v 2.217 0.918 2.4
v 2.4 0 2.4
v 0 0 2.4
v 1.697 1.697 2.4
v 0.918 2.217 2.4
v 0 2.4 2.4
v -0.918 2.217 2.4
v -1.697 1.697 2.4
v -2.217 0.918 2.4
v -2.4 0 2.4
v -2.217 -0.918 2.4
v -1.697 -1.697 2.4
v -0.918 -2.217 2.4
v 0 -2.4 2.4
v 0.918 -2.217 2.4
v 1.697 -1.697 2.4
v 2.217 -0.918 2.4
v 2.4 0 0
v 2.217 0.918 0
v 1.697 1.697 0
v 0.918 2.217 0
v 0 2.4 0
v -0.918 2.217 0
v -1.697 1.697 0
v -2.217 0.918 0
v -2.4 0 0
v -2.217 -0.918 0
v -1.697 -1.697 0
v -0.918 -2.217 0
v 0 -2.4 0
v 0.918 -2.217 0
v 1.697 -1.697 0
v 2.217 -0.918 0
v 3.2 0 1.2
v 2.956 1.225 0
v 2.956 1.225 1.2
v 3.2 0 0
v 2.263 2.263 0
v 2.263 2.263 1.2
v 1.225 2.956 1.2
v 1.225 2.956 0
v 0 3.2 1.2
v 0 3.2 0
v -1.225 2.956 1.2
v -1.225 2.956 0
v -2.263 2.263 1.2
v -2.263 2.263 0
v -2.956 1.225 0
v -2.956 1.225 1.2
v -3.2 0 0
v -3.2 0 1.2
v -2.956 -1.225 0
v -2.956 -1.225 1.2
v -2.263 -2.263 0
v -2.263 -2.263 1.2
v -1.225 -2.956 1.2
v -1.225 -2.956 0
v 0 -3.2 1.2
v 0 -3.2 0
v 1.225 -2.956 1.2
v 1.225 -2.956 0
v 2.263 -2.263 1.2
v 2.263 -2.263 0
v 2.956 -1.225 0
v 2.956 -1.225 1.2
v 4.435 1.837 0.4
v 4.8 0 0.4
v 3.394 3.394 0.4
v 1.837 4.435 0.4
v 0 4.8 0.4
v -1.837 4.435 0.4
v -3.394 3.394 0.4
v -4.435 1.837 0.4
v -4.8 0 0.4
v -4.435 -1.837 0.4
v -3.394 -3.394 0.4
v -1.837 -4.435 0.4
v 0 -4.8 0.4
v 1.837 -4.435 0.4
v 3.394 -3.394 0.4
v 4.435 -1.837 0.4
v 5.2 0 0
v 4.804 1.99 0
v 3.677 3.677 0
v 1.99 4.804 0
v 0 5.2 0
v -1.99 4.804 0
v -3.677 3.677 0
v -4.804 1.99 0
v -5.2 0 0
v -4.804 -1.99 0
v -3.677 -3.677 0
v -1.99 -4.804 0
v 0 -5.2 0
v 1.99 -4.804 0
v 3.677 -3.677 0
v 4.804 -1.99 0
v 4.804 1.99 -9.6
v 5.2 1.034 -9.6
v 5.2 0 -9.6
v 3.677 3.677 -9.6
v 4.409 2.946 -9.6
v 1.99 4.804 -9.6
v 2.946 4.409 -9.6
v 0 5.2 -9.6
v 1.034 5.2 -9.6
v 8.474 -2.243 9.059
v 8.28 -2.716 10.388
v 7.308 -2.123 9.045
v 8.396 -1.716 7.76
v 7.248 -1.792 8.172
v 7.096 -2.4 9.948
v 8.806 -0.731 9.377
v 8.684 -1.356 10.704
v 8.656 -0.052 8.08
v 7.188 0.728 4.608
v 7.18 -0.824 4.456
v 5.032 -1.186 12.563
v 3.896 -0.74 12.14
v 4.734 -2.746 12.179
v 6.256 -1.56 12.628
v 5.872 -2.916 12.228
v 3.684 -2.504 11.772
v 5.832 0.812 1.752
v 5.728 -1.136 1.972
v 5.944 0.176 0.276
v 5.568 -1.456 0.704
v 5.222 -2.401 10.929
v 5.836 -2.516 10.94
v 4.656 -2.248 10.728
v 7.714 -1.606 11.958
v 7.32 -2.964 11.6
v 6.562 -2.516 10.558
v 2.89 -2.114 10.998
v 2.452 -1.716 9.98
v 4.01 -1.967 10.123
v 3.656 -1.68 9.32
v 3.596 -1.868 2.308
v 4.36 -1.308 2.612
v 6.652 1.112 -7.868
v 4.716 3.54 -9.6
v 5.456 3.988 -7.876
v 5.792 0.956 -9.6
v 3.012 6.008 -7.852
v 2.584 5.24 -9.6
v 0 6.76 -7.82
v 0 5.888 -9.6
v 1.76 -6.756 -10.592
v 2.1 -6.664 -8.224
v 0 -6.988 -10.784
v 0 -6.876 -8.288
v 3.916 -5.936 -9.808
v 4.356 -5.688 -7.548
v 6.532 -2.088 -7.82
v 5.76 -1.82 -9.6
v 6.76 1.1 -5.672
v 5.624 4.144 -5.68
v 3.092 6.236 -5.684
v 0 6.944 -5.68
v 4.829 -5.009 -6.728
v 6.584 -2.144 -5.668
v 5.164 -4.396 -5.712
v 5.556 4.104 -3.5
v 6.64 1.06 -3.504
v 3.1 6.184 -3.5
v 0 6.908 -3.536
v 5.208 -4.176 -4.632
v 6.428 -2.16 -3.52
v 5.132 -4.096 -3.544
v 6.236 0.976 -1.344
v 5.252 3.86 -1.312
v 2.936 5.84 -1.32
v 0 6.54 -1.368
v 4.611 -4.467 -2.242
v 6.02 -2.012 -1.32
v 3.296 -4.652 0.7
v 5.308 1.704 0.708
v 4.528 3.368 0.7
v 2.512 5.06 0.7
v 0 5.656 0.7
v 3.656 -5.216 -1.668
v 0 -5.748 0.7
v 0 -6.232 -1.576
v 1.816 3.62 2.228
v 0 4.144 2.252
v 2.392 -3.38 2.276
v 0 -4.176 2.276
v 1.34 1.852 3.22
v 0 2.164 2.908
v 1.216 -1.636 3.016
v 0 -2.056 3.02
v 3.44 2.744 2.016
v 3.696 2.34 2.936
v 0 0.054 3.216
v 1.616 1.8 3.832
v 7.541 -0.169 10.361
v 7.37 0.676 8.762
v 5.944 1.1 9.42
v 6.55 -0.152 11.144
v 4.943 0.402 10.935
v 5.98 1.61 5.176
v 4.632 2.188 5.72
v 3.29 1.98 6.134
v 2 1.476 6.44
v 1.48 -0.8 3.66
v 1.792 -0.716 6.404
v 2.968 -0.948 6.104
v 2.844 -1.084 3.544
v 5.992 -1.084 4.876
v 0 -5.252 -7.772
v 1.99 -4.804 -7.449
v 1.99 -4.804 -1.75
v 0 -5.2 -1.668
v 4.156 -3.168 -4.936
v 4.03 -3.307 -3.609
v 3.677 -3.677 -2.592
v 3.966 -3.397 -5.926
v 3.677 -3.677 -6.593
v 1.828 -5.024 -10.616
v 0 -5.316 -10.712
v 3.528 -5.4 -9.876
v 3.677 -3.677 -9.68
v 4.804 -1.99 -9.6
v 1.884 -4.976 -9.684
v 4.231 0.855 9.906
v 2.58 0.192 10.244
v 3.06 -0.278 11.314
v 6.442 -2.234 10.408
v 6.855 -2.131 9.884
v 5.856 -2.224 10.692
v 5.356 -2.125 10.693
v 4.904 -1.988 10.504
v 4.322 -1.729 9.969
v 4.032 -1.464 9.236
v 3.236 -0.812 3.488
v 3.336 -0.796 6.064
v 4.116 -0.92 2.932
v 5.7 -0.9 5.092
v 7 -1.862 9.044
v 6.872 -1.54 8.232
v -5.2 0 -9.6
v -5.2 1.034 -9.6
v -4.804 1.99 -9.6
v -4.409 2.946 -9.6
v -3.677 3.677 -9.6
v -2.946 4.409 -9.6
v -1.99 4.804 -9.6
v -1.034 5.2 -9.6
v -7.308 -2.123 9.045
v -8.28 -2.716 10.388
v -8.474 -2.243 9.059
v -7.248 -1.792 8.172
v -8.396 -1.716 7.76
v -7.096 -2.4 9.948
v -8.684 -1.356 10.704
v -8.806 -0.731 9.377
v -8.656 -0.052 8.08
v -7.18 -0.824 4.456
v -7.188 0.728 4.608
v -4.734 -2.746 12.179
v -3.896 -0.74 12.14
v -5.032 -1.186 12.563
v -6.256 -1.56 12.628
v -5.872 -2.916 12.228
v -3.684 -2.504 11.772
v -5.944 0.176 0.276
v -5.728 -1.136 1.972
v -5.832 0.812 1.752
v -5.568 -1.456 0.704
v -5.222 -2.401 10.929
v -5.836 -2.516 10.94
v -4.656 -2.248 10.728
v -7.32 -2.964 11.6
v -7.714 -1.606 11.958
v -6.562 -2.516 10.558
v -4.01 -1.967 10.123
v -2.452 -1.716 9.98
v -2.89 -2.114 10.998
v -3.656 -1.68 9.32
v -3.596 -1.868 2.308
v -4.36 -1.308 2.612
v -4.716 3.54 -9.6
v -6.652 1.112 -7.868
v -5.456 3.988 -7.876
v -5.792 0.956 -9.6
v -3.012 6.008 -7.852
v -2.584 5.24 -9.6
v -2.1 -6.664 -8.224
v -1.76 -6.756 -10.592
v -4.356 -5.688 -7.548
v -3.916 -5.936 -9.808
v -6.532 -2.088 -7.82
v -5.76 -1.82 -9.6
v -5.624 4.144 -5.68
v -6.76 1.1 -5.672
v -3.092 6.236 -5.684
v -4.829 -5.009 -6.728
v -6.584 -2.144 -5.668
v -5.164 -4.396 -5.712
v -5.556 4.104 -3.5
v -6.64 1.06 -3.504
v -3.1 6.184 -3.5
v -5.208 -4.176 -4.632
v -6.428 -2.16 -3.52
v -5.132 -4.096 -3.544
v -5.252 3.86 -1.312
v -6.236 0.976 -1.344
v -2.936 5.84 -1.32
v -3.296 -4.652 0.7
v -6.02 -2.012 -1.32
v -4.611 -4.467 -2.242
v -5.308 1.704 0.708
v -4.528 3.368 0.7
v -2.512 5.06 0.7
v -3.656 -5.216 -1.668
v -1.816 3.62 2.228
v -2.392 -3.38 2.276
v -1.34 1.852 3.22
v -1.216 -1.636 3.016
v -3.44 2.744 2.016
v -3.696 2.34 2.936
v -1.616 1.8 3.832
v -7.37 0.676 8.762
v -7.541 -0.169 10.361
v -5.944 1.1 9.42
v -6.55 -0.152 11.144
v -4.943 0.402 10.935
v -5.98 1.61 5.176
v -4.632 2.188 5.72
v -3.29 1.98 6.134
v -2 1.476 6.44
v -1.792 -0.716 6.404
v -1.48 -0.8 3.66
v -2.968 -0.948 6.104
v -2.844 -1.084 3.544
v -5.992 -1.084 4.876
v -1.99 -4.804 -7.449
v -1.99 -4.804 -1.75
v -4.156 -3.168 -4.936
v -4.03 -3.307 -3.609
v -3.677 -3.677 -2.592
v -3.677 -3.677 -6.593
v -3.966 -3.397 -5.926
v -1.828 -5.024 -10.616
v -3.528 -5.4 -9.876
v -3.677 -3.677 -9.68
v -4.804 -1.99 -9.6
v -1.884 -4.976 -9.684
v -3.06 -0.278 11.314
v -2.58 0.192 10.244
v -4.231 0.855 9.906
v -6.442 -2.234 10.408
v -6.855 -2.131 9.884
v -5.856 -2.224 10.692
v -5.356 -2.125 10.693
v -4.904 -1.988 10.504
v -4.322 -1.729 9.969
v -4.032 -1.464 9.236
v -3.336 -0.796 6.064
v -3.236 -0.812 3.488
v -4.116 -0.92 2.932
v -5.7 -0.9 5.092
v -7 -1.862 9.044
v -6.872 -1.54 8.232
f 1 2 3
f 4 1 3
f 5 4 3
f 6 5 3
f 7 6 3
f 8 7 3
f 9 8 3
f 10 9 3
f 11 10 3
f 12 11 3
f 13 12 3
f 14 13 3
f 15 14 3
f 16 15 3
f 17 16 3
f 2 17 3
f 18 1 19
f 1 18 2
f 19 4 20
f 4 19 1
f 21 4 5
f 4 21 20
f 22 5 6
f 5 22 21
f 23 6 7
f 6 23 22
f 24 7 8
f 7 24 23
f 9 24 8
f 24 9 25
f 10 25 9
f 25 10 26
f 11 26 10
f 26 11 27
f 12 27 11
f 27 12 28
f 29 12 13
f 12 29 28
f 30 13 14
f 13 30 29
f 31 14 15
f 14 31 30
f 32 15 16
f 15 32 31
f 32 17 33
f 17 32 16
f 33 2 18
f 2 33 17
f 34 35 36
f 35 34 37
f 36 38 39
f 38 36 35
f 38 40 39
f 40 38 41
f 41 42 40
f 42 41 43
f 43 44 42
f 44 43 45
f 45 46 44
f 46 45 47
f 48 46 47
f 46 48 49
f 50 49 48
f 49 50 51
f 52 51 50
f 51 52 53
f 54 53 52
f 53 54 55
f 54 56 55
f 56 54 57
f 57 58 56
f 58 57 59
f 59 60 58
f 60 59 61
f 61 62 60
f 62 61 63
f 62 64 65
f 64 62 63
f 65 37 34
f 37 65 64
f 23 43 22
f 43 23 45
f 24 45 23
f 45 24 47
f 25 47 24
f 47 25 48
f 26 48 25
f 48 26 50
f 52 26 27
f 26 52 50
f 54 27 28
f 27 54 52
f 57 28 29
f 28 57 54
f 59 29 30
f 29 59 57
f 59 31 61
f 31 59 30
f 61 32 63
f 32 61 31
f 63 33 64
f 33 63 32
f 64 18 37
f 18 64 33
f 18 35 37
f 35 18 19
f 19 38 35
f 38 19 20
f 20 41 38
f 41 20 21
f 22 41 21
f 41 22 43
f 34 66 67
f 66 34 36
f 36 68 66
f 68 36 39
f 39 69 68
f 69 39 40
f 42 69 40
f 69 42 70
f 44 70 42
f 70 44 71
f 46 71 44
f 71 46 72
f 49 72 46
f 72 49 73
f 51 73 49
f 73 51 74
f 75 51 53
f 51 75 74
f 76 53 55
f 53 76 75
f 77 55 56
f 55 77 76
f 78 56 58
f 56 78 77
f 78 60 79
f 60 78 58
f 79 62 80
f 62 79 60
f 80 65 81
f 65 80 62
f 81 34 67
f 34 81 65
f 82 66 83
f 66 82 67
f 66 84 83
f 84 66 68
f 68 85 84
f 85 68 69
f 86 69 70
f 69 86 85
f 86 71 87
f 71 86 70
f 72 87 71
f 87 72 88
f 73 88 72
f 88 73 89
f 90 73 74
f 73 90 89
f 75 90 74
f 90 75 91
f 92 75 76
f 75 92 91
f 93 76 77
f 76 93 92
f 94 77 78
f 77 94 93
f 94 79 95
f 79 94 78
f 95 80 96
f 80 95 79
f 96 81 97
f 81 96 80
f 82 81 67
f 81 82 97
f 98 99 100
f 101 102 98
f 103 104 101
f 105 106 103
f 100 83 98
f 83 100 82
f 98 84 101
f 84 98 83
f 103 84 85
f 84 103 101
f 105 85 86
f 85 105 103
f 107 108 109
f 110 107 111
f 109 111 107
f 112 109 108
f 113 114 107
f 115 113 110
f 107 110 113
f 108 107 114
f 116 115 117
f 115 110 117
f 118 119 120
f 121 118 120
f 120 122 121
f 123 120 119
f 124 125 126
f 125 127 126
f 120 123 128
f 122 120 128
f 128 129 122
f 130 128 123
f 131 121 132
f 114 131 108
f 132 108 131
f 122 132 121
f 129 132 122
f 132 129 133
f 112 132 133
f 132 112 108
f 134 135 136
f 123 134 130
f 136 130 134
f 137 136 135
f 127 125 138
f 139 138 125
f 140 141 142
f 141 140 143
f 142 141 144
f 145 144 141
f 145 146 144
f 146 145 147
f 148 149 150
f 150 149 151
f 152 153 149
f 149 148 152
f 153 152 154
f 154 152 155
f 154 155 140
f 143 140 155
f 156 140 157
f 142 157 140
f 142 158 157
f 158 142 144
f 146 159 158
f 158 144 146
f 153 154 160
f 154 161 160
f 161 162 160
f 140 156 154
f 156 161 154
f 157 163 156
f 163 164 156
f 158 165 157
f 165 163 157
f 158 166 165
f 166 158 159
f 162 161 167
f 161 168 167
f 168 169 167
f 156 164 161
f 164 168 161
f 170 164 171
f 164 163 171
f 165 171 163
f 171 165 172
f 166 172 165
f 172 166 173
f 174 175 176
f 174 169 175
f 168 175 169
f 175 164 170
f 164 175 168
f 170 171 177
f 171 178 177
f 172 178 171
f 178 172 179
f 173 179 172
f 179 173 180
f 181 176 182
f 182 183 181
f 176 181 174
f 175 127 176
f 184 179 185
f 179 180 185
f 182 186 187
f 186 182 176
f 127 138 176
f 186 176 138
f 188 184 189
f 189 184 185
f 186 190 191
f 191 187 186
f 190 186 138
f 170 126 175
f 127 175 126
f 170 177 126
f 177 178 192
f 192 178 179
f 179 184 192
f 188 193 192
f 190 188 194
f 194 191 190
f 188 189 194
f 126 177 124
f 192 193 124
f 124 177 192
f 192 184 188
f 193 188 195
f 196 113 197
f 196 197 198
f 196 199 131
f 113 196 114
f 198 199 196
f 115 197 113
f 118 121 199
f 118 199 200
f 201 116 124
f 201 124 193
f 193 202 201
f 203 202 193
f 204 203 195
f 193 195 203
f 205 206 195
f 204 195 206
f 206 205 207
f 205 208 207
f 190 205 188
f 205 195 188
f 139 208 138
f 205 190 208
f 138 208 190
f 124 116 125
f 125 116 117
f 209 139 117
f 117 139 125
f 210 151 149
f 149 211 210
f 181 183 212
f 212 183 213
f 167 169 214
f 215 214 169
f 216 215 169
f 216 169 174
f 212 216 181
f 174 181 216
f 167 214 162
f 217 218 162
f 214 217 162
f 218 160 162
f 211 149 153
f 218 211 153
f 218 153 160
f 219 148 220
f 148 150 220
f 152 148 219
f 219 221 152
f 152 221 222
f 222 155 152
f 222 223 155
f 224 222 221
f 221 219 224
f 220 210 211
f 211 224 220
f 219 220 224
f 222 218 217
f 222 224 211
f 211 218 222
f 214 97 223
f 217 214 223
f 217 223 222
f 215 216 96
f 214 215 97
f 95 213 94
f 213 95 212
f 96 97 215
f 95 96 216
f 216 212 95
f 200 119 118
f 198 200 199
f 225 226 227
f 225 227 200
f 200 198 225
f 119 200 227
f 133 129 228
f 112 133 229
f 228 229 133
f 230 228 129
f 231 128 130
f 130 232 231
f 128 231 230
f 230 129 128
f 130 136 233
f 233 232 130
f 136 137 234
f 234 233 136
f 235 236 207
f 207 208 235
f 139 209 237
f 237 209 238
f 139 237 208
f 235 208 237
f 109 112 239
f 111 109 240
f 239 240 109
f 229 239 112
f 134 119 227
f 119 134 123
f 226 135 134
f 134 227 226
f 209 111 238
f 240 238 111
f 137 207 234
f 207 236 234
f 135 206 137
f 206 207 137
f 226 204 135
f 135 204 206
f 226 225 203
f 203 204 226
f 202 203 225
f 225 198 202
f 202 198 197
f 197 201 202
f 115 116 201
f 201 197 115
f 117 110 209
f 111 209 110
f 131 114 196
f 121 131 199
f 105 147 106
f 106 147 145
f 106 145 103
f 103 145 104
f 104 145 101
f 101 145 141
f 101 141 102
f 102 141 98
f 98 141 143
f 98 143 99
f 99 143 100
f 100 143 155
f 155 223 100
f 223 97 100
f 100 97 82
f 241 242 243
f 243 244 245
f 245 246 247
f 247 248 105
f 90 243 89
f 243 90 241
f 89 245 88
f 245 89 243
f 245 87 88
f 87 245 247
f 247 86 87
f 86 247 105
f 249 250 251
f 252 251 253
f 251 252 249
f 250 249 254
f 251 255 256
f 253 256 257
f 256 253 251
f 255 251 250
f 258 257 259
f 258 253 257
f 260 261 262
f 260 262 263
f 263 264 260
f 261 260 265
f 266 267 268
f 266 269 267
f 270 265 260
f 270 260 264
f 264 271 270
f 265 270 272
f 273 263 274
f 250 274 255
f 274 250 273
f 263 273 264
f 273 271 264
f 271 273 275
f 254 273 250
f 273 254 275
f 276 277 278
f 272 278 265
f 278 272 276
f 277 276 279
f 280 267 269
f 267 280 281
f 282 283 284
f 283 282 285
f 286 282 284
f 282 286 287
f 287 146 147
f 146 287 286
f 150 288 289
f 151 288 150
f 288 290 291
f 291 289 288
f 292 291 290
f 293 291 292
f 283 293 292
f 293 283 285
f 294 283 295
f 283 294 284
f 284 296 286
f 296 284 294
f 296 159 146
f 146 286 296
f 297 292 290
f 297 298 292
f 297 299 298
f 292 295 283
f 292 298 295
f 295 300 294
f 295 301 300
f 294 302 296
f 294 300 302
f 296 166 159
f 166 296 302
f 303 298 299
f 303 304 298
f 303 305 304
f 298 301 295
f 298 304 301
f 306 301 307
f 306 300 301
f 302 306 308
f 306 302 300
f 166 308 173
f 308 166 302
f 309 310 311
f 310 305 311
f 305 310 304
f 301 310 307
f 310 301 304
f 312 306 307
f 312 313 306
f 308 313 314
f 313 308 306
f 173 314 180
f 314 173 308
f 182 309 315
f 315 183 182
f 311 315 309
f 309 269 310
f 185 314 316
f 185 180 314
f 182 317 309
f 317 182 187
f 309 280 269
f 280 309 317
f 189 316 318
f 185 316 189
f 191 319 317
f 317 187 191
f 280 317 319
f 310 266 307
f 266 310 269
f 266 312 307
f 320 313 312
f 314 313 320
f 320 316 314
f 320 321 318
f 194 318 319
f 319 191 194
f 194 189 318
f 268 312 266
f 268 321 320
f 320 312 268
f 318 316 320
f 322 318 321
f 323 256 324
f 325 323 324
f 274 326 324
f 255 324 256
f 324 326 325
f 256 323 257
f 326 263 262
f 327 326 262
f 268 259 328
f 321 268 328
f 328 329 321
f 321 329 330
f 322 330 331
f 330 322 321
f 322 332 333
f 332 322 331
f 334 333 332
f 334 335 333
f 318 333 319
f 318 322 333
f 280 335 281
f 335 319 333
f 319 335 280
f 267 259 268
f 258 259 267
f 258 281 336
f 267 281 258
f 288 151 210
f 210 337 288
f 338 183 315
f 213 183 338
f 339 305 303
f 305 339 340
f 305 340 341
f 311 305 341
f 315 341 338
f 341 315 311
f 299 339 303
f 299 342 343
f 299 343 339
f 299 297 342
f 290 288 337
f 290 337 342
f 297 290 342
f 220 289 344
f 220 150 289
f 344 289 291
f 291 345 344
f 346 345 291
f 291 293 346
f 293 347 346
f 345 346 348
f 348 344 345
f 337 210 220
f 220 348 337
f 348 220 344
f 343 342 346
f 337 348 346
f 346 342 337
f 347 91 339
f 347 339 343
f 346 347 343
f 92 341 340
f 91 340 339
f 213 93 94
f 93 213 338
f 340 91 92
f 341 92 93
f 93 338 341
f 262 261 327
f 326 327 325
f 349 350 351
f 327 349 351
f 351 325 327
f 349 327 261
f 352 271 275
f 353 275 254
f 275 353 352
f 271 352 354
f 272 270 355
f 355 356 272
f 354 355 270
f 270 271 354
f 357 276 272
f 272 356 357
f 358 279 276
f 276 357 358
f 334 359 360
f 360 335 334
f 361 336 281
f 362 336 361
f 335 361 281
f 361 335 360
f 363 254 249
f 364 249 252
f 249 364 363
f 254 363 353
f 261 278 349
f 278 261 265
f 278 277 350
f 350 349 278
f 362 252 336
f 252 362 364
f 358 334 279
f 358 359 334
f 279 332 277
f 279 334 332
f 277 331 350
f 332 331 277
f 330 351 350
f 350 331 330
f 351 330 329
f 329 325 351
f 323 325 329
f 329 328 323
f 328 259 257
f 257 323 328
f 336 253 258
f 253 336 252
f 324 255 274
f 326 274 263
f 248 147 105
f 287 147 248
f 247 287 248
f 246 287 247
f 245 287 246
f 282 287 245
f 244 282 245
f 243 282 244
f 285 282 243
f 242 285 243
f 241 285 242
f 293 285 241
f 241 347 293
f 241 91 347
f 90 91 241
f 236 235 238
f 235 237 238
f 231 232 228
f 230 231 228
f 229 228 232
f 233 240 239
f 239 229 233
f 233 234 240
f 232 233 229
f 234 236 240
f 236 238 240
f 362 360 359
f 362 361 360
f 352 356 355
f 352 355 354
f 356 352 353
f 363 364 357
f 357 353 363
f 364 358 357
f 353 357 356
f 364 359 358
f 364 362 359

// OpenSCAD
use <../lib.scad>
use <../p/4-4con12.scad>
use <../p/4-4con2.scad>
use <../p/4-4disc.scad>
use <s/99244s01.scad>
use <s/99244s02.scad>
use <../p/stud4h.scad>
function ldraw_lib__99244p01() = [
// 0 Minifig Headdress Rabbit with Bright Pink Inner Ear Pattern
// 0 Name: 99244p01.dat
// 0 Author: Gerald Lasser [GeraldLasser]
// 0 !LDRAW_ORG Part UPDATE 2023-04
// 0 !LICENSE Licensed under CC BY 4.0 : see CAreadme.txt
// 
// 0 BFC CERTIFY CCW
  [0,"BFC","CERTIFY"],
  [0,"BFC","CCW"],
// 
// 0 !CATEGORY Minifig Headwear
// 0 !KEYWORDS Bricklink 99244pb01, Bunny, Collectible Minifigures, Costume, Ears
// 0 !KEYWORDS mask, Series 7, Set 8831
// 
// 0 !HISTORY 2023-08-25 [OrionP] Official Update 2023-04
// 
// 
// 1 16 0 -6 0 6 0 0 0 -1 0 0 0 6 4-4disc.dat
  [1,16,0,-6,0,6,0,0,0,-1,0,0,0,6, ldraw_lib__4_4disc()],
// 1 16 0 -3 0 1 0 0 0 -.75 0 0 0 1 stud4h.dat
  [1,16,0,-3,0,1,0,0,0,-.75,0,0,0,1, ldraw_lib__stud4h()],
// 0 BFC INVERTNEXT
  [0,"BFC","INVERTNEXT"],
// 1 16 0 -1 0 4 0 0 0 -2 0 0 0 4 4-4con2.dat
  [1,16,0,-1,0,4,0,0,0,-2,0,0,0,4, ldraw_lib__4_4con2()],
// 0 BFC INVERTNEXT
  [0,"BFC","INVERTNEXT"],
// 1 16 0 0 0 1 0 0 0 -1 0 0 0 1 4-4con12.dat
  [1,16,0,0,0,1,0,0,0,-1,0,0,0,1, ldraw_lib__4_4con12()],
// 
// 1 16 0 0 0 1 0 0 0 1 0 0 0 1 s\99244s01.dat
  [1,16,0,0,0,1,0,0,0,1,0,0,0,1, ldraw_lib__s__99244s01()],
// 1 16 0 0 0 -1 0 0 0 1 0 0 0 1 s\99244s01.dat
  [1,16,0,0,0,-1,0,0,0,1,0,0,0,1, ldraw_lib__s__99244s01()],
// 
// 1 29 0 0 0 1 0 0 0 1 0 0 0 1 s\99244s02.dat
  [1,29,0,0,0,1,0,0,0,1,0,0,0,1, ldraw_lib__s__99244s02()],
// 1 29 0 0 0 -1 0 0 0 1 0 0 0 1 s\99244s02.dat
  [1,29,0,0,0,-1,0,0,0,1,0,0,0,1, ldraw_lib__s__99244s02()],
// 
// 5 24 0 8.84 17.27 0 3.42 16.35 -7.34 3.3 14.6 7.34 3.3 14.6
  [5,24,0,8.84,17.27,0,3.42,16.35,-7.34,3.3,14.6,7.34,3.3,14.6],
// 5 24 0 3.94 -15.58 0 4.17 -13 4.9751 4.3745 -12.0107 -4.9751 4.3745 -12.0107
  [5,24,0,3.94,-15.58,0,4.17,-13,4.9751,4.3745,-12.0107,-4.9751,4.3745,-12.0107],
// 5 24 0 19.43 -13.13 0 20.72 -17.19 5.25 20.56 -16.66 -5.25 20.56 -16.66
  [5,24,0,19.43,-13.13,0,20.72,-17.19,5.25,20.56,-16.66,-5.25,20.56,-16.66],
// 5 24 0 -7.55 -5.14 0 -5.69 -10.44 5.98 -5.69 -8.45 -5.98 -5.69 -8.45
  [5,24,0,-7.55,-5.14,0,-5.69,-10.44,5.98,-5.69,-8.45,-5.98,-5.69,-8.45],
// 5 24 0 24 14.72 0 19.55 16.9 -7.53 19.63 15.02 7.53 19.63 15.02
  [5,24,0,24,14.72,0,19.55,16.9,-7.53,19.63,15.02,7.53,19.63,15.02],
// 5 24 0 -7.27 5.41 0 -8.04 .135 3.35 -8.05 4.63 -3.35 -8.05 4.63
  [5,24,0,-7.27,5.41,0,-8.04,.135,3.35,-8.05,4.63,-3.35,-8.05,4.63],
// 5 24 0 -5.63 10.36 0 -7.27 5.41 4.54 -5.57 9.05 -4.54 -5.57 9.05
  [5,24,0,-5.63,10.36,0,-7.27,5.41,4.54,-5.57,9.05,-4.54,-5.57,9.05],
// 5 24 0 20.72 -17.19 0 26.96 -17.47 -5.25 20.56 -16.66 5.25 20.56 -16.66
  [5,24,0,20.72,-17.19,0,26.96,-17.47,-5.25,20.56,-16.66,5.25,20.56,-16.66],
// 5 24 0 19.55 16.9 0 14.2 17.36 -7.53 19.63 15.02 7.53 19.63 15.02
  [5,24,0,19.55,16.9,0,14.2,17.36,-7.53,19.63,15.02,7.53,19.63,15.02],
// 5 24 0 -8.04 .135 0 -7.55 -5.14 3.04 -7.54 -4.09 -3.04 -7.54 -4.09
  [5,24,0,-8.04,.135,0,-7.55,-5.14,3.04,-7.54,-4.09,-3.04,-7.54,-4.09],
// 5 24 0 4.17 -13 0 0 -13 -4.9751 0 -12.0107 4.9751 0 -12.0107
  [5,24,0,4.17,-13,0,0,-13,-4.9751,0,-12.0107,4.9751,0,-12.0107],
// 5 24 0 3.42 16.35 0 -1.75 14.14 -6.28 -1.75 12.65 6.28 -1.75 12.65
  [5,24,0,3.42,16.35,0,-1.75,14.14,-6.28,-1.75,12.65,6.28,-1.75,12.65],
// 5 24 0 -1.75 14.14 0 -5.63 10.36 -6.28 -1.75 12.65 6.28 -1.75 12.65
  [5,24,0,-1.75,14.14,0,-5.63,10.36,-6.28,-1.75,12.65,6.28,-1.75,12.65],
// 5 24 0 26.78 -13.29 0 19.43 -13.13 4.9751 18.623 -12.0107 -4.9751 18.623 -12.0107
  [5,24,0,26.78,-13.29,0,19.43,-13.13,4.9751,18.623,-12.0107,-4.9751,18.623,-12.0107],
// 5 24 0 -5.69 -10.44 0 -1.75 -14.37 -8.24 -1.75 -11.63 8.24 -1.75 -11.63
  [5,24,0,-5.69,-10.44,0,-1.75,-14.37,-8.24,-1.75,-11.63,8.24,-1.75,-11.63],
// 5 24 0 -1.75 -14.37 0 3.94 -15.58 -9.14 4.17 -13.04 9.14 4.17 -13.04
  [5,24,0,-1.75,-14.37,0,3.94,-15.58,-9.14,4.17,-13.04,9.14,4.17,-13.04],
// 5 24 0 14.2 17.36 0 8.84 17.27 7.75 8.75 15.46 -7.75 8.75 15.46
  [5,24,0,14.2,17.36,0,8.84,17.27,7.75,8.75,15.46,-7.75,8.75,15.46],
// 5 24 0 26.96 -17.47 0 26.78 -13.29 4.4 26.48 -16.89 -4.4 26.48 -16.89
  [5,24,0,26.96,-17.47,0,26.78,-13.29,4.4,26.48,-16.89,-4.4,26.48,-16.89],
];
module ldraw_lib__99244p01(step=0, col=false, unit=2/5, alt=false, line=0.2, solid=!$preview)
    makepoly(ldraw_lib__99244p01(), step=step, col=col, unit=unit, alt=alt, line=line, solid=solid);
ldraw_lib__99244p01(line=0.2);
